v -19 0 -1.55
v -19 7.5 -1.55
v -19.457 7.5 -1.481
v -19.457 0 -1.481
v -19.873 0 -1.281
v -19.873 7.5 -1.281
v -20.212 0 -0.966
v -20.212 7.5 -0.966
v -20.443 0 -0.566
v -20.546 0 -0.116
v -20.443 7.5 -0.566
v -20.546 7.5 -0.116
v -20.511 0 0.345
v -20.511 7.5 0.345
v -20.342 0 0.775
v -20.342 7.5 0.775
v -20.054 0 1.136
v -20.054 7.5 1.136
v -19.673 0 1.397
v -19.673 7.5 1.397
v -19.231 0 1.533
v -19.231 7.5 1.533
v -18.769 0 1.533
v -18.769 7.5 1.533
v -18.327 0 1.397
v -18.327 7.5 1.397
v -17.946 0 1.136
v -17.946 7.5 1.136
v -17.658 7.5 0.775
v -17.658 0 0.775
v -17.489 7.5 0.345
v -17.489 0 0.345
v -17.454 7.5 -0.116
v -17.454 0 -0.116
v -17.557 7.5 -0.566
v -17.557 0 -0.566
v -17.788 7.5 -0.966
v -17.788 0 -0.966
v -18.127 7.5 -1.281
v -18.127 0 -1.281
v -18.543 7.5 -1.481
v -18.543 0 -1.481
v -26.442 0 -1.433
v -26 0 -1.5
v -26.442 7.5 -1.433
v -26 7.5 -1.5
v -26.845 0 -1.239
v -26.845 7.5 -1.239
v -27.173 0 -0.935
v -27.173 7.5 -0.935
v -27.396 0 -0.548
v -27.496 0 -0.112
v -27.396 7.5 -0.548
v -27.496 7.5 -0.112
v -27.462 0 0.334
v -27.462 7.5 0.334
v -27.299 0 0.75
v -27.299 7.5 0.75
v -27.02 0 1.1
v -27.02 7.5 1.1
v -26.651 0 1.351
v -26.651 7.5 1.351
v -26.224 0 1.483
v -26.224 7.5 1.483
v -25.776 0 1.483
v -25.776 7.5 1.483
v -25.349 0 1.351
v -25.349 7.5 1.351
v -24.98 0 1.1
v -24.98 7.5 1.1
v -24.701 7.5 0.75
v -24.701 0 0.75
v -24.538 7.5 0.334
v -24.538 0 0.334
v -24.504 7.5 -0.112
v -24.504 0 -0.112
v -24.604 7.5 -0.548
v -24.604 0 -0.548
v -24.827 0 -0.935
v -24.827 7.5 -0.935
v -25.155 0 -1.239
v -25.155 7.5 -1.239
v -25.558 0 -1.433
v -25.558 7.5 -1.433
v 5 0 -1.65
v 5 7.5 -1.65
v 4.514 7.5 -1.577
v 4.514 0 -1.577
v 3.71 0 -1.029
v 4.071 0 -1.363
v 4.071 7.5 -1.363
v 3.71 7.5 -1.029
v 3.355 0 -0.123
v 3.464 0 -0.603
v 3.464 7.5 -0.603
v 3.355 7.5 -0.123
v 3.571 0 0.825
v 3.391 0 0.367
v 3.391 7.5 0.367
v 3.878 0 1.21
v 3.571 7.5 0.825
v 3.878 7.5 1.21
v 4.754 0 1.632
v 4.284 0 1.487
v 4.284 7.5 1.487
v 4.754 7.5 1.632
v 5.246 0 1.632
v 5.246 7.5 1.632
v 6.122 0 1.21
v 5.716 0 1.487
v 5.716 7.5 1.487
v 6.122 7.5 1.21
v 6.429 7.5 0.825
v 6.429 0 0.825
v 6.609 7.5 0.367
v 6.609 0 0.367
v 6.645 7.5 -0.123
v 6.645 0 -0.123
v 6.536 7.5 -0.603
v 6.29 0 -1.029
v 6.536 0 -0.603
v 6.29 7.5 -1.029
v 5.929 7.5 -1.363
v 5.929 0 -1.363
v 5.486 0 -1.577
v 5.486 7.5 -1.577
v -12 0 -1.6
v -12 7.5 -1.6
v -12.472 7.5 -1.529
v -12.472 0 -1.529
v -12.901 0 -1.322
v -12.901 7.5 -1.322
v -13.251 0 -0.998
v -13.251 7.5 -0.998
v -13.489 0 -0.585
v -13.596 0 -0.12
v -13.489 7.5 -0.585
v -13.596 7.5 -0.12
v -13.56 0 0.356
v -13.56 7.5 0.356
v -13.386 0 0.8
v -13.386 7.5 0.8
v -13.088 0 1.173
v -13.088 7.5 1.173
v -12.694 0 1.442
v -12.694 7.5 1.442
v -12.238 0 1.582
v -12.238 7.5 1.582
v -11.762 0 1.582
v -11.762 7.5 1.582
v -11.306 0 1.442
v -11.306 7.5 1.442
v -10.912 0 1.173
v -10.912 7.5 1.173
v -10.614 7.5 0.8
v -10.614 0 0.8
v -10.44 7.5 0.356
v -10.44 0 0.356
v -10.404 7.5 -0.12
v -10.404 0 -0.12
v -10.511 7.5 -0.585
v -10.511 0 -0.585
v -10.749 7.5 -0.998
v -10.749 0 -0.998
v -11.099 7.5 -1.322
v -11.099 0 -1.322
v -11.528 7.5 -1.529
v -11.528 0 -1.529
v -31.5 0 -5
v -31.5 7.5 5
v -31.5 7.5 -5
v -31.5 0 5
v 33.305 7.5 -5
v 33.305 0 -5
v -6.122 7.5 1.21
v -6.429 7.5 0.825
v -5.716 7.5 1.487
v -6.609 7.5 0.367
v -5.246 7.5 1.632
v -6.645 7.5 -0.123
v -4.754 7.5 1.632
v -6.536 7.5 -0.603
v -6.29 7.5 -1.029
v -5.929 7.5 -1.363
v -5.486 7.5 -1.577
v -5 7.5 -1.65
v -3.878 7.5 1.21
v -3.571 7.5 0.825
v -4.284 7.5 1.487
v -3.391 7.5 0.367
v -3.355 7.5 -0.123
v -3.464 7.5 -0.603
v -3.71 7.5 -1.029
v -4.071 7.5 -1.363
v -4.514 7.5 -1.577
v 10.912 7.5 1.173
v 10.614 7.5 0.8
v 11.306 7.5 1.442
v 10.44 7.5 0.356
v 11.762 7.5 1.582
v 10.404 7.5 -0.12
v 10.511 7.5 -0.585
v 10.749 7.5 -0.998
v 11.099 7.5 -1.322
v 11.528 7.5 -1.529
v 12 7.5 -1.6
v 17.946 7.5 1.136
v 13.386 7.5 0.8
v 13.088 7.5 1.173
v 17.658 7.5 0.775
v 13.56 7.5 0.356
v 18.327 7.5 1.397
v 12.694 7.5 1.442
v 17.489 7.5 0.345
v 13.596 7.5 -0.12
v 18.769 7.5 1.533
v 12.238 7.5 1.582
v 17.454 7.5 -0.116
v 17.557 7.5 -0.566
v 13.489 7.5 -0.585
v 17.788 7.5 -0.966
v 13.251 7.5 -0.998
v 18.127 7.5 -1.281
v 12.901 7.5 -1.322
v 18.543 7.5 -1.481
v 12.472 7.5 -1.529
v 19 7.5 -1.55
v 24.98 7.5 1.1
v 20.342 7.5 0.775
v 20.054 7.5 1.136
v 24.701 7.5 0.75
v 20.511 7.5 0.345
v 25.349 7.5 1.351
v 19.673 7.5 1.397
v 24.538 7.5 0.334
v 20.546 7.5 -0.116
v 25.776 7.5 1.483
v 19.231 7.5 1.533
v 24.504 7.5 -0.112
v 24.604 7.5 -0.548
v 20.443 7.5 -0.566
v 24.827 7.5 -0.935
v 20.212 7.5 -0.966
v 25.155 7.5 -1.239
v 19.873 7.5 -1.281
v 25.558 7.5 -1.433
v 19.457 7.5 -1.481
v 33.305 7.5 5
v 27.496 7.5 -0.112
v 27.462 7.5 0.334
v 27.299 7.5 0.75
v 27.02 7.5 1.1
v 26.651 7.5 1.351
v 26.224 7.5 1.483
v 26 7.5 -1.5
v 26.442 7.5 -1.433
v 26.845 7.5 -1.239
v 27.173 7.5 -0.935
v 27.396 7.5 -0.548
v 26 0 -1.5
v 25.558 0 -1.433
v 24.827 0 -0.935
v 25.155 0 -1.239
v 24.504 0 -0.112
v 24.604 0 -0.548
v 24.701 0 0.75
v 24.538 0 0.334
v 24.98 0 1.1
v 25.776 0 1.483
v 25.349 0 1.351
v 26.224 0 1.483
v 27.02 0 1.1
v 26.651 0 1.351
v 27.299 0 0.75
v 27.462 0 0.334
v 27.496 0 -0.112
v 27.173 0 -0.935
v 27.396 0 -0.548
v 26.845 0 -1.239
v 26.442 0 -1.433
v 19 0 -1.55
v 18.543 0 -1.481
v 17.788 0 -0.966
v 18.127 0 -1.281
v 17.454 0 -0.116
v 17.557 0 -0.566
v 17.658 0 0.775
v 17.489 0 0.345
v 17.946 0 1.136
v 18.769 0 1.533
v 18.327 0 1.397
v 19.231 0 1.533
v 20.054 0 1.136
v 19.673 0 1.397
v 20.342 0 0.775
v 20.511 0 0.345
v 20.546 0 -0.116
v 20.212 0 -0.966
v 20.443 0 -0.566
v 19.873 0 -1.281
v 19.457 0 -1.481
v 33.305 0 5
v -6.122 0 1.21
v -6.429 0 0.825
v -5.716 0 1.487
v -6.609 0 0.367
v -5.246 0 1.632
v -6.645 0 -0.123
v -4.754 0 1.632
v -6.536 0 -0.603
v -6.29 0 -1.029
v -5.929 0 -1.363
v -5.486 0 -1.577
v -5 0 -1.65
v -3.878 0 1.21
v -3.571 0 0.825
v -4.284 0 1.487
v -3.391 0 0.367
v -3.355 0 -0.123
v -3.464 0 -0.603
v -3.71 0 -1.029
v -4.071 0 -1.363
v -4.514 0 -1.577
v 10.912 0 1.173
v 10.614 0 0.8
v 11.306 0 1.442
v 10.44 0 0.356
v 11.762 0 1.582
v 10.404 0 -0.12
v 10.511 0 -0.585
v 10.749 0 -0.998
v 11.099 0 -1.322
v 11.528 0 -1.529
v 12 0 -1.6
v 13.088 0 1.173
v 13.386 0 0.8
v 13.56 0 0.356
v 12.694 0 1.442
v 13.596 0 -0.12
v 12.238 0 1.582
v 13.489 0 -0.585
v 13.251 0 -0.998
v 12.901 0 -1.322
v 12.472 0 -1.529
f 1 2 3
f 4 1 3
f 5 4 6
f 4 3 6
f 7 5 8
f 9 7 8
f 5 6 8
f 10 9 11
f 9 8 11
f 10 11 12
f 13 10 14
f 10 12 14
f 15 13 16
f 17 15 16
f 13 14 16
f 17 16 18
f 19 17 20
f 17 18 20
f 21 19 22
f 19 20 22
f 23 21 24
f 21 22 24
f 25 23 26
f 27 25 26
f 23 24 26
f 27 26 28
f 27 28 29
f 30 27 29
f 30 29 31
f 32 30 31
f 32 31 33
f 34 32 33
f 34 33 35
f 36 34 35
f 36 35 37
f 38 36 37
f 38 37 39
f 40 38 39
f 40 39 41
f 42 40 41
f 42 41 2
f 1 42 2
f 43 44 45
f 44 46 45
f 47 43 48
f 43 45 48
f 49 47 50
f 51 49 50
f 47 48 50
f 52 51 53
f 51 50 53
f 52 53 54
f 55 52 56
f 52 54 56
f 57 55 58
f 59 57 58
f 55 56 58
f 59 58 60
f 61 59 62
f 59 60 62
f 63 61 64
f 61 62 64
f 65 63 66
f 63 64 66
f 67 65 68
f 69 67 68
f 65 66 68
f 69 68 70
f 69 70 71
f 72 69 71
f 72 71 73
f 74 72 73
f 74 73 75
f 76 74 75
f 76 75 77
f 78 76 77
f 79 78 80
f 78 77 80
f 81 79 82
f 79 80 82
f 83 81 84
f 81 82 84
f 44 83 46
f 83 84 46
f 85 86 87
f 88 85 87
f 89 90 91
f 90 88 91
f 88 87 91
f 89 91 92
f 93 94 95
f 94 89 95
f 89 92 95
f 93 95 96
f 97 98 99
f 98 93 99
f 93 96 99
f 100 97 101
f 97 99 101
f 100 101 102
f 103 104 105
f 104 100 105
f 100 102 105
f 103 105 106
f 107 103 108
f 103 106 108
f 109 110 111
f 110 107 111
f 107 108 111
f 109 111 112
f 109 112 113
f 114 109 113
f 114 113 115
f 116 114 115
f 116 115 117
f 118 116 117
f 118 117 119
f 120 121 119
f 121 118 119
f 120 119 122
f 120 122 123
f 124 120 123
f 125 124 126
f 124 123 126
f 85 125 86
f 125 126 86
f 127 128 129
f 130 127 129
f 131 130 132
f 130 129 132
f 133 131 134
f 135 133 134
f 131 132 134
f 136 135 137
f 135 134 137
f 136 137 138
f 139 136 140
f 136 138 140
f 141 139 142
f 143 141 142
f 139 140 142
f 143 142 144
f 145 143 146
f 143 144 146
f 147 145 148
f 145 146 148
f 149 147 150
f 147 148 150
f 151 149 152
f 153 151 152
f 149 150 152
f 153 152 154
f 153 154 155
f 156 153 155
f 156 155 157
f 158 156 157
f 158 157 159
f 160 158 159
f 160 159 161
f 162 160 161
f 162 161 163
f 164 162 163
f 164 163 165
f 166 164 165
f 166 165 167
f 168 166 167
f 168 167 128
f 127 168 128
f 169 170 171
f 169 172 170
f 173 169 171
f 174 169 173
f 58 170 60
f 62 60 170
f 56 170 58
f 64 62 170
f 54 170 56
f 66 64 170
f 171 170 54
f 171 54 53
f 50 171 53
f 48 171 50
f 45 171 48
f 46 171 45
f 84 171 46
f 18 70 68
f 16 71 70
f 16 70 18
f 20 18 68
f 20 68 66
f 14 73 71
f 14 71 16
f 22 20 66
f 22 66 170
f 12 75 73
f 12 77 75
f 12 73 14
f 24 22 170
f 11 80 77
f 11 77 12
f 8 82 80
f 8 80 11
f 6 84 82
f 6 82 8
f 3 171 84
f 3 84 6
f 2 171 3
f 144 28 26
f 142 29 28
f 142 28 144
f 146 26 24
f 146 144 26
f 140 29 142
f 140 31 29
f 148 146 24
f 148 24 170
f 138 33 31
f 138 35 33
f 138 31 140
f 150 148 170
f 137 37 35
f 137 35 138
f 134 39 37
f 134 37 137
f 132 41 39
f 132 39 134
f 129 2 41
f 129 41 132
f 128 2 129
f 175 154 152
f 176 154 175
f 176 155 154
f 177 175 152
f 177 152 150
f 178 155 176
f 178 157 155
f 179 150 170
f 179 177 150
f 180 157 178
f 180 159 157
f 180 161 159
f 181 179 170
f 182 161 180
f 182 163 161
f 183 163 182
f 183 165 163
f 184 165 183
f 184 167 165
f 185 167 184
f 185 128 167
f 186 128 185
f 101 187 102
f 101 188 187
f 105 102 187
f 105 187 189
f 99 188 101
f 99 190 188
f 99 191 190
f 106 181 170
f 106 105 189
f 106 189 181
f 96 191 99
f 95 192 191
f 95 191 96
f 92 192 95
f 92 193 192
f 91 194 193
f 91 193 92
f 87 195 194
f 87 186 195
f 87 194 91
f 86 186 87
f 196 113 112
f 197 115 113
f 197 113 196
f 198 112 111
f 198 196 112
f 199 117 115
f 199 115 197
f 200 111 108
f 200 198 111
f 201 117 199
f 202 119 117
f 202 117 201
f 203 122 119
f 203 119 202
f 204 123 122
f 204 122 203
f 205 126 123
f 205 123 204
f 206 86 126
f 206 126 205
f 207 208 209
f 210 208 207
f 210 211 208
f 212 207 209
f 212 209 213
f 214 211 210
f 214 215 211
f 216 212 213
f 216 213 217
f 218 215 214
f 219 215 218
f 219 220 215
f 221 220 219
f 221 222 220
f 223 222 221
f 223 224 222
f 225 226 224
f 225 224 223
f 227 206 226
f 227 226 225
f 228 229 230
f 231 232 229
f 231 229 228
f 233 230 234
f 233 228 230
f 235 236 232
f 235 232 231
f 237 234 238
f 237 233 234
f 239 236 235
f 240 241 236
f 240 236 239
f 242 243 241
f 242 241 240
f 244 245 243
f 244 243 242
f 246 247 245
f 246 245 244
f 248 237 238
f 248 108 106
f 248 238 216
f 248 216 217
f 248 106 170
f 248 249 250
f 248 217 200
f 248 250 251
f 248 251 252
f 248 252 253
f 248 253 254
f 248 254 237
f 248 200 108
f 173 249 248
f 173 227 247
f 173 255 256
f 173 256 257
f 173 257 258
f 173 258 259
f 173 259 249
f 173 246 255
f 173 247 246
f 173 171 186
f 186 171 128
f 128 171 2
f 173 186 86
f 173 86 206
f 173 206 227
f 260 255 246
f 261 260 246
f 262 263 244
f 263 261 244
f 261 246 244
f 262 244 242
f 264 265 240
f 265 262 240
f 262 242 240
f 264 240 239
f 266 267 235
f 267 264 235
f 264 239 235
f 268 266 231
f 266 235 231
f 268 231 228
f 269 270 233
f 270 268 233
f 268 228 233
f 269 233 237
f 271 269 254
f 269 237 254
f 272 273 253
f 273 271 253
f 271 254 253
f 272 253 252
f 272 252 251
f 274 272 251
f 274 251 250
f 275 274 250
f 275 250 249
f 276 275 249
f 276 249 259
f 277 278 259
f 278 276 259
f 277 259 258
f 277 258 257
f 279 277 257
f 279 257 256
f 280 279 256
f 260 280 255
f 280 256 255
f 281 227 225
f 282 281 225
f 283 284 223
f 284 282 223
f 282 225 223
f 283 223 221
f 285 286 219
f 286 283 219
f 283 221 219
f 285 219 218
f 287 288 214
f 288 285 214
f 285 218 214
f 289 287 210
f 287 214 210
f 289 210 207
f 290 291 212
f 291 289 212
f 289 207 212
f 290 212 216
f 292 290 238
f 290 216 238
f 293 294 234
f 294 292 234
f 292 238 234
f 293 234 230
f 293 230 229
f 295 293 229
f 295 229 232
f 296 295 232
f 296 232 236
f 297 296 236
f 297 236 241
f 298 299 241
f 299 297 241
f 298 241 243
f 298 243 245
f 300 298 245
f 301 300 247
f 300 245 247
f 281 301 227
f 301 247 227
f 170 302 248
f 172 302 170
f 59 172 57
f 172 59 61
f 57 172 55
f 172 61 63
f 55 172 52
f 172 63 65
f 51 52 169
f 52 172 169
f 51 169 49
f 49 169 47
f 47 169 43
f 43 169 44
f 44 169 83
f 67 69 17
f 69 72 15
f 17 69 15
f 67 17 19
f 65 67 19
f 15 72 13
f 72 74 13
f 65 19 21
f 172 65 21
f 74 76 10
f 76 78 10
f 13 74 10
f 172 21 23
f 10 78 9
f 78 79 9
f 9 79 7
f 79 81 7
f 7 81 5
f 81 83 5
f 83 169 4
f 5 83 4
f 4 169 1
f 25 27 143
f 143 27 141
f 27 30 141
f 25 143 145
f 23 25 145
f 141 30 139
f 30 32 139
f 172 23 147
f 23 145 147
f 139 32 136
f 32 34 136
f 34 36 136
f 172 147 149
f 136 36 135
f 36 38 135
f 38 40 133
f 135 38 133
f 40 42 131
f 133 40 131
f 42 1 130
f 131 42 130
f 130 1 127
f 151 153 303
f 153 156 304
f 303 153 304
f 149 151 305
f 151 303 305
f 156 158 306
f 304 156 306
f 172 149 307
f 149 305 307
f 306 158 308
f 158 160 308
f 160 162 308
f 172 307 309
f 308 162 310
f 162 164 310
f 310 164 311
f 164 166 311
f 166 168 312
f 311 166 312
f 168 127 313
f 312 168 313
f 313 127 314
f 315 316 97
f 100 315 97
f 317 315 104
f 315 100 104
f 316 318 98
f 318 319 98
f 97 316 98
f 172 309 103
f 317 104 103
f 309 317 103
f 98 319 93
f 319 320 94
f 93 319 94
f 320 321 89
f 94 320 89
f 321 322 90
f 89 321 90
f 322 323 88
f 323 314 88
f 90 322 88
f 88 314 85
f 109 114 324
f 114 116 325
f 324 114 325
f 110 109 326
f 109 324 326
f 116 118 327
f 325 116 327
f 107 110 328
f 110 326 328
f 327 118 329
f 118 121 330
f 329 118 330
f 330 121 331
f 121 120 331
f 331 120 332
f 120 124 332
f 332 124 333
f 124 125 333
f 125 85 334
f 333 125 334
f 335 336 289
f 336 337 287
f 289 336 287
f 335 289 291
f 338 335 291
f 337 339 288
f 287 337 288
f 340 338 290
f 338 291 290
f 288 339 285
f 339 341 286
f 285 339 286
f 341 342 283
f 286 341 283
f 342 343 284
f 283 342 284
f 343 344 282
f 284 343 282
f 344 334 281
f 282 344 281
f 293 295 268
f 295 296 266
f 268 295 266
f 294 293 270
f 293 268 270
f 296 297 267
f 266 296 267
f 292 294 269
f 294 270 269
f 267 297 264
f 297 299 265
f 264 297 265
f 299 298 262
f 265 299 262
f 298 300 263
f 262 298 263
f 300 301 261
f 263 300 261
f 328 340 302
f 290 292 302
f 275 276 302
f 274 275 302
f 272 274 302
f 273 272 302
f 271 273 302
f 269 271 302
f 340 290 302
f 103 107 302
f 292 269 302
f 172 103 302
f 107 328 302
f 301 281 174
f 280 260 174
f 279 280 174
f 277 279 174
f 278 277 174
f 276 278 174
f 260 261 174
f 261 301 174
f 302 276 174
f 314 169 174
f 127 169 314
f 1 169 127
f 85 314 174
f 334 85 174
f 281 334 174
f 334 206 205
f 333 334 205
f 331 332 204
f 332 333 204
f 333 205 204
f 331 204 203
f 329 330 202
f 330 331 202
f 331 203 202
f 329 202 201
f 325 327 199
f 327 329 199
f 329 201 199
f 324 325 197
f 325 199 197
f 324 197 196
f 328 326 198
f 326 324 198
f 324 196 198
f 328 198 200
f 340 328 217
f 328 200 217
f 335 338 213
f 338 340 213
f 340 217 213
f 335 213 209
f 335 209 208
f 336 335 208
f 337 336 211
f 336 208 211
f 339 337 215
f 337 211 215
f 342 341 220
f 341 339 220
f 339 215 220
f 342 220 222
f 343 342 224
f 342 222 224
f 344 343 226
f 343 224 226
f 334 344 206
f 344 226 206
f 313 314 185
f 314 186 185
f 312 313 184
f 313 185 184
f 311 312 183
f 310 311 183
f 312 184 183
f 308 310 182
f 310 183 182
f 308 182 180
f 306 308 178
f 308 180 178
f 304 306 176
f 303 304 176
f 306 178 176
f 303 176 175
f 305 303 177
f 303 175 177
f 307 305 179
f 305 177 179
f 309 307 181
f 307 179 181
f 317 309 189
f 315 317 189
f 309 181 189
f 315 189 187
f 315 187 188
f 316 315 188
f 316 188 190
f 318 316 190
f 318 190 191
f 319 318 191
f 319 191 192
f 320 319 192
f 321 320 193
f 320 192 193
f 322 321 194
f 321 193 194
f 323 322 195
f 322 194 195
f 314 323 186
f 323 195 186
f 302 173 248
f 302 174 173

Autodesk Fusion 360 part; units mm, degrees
sketch "Sketch1" plane through (0, 0, 0) normal (0, 1, 0) x (1, 0, 0)
  line L0 (-31.5, 5) -> (33.3053, 5)
  line L1 (33.3053, 5) -> (33.3053, -5)
  line L2 (33.3053, -5) -> (-31.5, -5)
  line L3 (-31.5, -5) -> (-31.5, 5)
  line L4 (-31.5, 0) -> (-36.5072, 0) construction
  line L5 (1.75, 0) -> (22.5, 0) construction
  point P0 (-26, 0)
  point P1 (-19, 0)
  point P2 (-12, 0)
  point P3 (-5, 0)
  point P4 (-31.5, 0)
  dimension "d6" = 7
  dimension "d7" = 0
  dimension "d21" = 5
  dimension "d22" = 5.5
  dimension "d23" = 10
extrude "Extrude1" add sketch "Sketch1" along normal blind 7.5
hole "Hole1" at (-26, 0, 0) direction (0, 1, 0) diameter 3 end up to surface (7.5 mm away)
hole "Hole2" at (-19, 0, 0) direction (0, 1, 0) diameter 3.1 end up to surface (7.5 mm away)
hole "Hole3" at (-12, 0, 0) direction (0, 1, 0) diameter 3.2 end up to surface (7.5 mm away)
hole "Hole4" at (-5, 0, 0) direction (0, 1, 0) diameter 3.3 end up to surface (7.5 mm away)
mirror "Mirror1" about plane through (0, 0, 0) normal (1, 0, 0) of "Hole4", "Hole3", "Hole2", "Hole1"
